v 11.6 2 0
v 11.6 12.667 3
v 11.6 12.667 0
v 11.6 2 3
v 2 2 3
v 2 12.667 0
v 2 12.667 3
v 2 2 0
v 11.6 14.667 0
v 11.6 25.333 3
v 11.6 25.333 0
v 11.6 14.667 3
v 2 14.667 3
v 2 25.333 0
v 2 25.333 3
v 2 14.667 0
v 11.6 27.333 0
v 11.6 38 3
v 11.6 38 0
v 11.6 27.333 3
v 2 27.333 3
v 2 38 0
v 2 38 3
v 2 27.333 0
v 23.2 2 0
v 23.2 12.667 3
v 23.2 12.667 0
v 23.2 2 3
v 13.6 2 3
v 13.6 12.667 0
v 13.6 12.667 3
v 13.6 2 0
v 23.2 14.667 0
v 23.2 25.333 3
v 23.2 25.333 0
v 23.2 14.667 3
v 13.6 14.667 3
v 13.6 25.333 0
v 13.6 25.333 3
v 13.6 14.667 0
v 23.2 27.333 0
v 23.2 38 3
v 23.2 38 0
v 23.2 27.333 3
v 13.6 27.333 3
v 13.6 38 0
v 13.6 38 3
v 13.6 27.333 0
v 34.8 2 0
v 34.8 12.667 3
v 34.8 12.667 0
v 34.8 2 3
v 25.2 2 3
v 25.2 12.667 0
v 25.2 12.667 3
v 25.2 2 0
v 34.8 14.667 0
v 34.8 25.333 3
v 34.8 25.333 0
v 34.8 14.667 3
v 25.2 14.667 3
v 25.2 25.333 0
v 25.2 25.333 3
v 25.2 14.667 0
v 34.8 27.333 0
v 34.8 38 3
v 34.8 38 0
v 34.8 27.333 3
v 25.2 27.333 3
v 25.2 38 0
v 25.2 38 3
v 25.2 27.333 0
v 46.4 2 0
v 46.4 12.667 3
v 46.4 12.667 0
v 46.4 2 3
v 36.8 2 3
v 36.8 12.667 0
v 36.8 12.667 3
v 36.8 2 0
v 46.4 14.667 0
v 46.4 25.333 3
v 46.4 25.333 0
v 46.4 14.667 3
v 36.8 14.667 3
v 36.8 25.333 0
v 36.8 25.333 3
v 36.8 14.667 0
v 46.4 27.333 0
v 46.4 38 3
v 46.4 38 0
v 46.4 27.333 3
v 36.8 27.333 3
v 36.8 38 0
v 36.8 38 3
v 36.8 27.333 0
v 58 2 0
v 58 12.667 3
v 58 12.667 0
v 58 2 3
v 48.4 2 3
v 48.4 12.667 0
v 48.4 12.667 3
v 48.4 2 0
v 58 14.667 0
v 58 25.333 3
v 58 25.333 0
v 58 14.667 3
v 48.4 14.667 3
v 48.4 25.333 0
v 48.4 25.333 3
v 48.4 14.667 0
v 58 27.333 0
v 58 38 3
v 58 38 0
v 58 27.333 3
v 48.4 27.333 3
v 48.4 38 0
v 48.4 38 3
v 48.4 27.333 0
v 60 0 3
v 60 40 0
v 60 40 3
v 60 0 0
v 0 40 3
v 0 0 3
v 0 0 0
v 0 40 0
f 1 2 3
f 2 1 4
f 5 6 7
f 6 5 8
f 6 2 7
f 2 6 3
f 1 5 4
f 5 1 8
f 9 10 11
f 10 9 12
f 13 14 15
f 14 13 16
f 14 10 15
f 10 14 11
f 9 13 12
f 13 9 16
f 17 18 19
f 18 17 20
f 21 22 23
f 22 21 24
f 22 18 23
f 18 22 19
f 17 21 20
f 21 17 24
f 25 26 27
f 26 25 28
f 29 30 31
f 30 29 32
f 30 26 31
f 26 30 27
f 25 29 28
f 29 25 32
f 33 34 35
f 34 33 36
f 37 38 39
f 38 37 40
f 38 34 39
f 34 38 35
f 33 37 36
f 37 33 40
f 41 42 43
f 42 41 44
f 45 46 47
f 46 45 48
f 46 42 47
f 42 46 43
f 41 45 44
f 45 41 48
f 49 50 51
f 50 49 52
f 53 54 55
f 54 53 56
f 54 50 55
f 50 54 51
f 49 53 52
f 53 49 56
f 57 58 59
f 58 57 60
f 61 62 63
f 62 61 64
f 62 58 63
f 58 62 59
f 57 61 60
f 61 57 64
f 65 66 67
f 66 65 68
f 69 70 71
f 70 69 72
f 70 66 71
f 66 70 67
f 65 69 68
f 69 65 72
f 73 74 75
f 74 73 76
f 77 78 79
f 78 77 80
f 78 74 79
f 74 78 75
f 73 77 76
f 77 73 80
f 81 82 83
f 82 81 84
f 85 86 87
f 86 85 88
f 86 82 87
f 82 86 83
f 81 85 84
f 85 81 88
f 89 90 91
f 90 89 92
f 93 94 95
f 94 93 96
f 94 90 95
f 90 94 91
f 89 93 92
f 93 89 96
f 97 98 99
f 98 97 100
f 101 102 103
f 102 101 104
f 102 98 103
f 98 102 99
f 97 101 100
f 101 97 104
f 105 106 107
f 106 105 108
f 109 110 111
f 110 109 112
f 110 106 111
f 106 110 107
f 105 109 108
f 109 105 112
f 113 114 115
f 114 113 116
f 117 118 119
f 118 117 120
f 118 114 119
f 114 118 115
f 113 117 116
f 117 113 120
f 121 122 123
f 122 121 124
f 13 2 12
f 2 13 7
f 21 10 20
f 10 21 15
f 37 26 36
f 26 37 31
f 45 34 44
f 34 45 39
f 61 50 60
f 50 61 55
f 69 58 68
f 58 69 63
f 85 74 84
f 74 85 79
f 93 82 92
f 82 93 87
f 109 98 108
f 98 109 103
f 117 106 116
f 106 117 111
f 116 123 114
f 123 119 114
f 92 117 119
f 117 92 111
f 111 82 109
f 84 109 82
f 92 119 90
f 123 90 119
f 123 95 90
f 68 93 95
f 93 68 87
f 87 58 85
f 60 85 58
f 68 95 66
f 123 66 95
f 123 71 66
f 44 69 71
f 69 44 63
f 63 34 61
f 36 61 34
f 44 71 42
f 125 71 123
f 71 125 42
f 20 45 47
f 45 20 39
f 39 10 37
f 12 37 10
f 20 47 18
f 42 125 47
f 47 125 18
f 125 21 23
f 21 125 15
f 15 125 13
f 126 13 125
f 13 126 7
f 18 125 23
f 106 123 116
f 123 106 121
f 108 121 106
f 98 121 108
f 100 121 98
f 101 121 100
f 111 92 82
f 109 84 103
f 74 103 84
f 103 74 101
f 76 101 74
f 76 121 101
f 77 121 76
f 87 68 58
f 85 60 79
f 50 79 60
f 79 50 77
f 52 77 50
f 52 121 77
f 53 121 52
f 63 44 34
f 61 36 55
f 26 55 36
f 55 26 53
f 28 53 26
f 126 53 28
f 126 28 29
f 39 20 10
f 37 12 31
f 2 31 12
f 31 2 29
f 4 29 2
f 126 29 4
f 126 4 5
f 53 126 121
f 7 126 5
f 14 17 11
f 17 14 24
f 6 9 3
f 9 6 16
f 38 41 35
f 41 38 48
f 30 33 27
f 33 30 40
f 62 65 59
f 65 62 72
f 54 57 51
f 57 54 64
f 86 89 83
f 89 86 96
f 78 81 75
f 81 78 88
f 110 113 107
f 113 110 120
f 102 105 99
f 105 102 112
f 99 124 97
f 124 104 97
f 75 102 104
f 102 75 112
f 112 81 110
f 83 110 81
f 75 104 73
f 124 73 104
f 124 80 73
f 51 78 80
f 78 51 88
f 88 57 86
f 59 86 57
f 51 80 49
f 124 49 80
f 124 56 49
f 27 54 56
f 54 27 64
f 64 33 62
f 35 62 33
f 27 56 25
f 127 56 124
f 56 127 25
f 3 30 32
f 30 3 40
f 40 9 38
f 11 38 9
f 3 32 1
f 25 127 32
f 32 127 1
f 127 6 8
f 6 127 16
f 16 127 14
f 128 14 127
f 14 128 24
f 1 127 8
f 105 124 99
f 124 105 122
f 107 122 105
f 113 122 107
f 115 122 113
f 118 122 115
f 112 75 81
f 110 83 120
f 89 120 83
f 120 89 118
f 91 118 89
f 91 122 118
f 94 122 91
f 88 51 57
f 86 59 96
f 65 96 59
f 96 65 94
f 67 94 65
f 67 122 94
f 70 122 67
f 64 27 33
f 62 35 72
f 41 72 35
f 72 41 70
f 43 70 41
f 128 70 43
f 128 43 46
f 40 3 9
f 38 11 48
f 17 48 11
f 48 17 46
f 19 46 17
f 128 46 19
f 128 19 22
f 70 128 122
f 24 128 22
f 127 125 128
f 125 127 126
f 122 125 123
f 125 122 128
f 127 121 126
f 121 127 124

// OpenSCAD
// Flat 3D-printable lightweight mounting plate
// Units: mm

plate_x = 60;
plate_y = 40;
plate_z = 3.0;

wall = 2.0;
cols = 5;
rows = 3;

hole_x = (plate_x - 2 * wall - (cols - 1) * wall) / cols;
hole_y = (plate_y - 2 * wall - (rows - 1) * wall) / rows;

solid_volume = plate_x * plate_y * plate_z;
lightened_volume = (plate_x * plate_y - cols * rows * hole_x * hole_y) * plate_z;

echo(str("solid_plate_volume_mm3=", solid_volume));
echo(str("lightened_plate_volume_mm3=", lightened_volume));
echo(str("mass_ratio_vs_solid=", lightened_volume / solid_volume));
echo(str("minimum_wall_mm=", wall));

module mounting_plate() {
    difference() {
        cube([plate_x, plate_y, plate_z], center = false);

        for (ix = [0 : cols - 1]) {
            for (iy = [0 : rows - 1]) {
                translate([
                    wall + ix * (hole_x + wall),
                    wall + iy * (hole_y + wall),
                    -0.1
                ])
                    cube([hole_x, hole_y, plate_z + 0.2], center = false);
            }
        }
    }
}

mounting_plate();
